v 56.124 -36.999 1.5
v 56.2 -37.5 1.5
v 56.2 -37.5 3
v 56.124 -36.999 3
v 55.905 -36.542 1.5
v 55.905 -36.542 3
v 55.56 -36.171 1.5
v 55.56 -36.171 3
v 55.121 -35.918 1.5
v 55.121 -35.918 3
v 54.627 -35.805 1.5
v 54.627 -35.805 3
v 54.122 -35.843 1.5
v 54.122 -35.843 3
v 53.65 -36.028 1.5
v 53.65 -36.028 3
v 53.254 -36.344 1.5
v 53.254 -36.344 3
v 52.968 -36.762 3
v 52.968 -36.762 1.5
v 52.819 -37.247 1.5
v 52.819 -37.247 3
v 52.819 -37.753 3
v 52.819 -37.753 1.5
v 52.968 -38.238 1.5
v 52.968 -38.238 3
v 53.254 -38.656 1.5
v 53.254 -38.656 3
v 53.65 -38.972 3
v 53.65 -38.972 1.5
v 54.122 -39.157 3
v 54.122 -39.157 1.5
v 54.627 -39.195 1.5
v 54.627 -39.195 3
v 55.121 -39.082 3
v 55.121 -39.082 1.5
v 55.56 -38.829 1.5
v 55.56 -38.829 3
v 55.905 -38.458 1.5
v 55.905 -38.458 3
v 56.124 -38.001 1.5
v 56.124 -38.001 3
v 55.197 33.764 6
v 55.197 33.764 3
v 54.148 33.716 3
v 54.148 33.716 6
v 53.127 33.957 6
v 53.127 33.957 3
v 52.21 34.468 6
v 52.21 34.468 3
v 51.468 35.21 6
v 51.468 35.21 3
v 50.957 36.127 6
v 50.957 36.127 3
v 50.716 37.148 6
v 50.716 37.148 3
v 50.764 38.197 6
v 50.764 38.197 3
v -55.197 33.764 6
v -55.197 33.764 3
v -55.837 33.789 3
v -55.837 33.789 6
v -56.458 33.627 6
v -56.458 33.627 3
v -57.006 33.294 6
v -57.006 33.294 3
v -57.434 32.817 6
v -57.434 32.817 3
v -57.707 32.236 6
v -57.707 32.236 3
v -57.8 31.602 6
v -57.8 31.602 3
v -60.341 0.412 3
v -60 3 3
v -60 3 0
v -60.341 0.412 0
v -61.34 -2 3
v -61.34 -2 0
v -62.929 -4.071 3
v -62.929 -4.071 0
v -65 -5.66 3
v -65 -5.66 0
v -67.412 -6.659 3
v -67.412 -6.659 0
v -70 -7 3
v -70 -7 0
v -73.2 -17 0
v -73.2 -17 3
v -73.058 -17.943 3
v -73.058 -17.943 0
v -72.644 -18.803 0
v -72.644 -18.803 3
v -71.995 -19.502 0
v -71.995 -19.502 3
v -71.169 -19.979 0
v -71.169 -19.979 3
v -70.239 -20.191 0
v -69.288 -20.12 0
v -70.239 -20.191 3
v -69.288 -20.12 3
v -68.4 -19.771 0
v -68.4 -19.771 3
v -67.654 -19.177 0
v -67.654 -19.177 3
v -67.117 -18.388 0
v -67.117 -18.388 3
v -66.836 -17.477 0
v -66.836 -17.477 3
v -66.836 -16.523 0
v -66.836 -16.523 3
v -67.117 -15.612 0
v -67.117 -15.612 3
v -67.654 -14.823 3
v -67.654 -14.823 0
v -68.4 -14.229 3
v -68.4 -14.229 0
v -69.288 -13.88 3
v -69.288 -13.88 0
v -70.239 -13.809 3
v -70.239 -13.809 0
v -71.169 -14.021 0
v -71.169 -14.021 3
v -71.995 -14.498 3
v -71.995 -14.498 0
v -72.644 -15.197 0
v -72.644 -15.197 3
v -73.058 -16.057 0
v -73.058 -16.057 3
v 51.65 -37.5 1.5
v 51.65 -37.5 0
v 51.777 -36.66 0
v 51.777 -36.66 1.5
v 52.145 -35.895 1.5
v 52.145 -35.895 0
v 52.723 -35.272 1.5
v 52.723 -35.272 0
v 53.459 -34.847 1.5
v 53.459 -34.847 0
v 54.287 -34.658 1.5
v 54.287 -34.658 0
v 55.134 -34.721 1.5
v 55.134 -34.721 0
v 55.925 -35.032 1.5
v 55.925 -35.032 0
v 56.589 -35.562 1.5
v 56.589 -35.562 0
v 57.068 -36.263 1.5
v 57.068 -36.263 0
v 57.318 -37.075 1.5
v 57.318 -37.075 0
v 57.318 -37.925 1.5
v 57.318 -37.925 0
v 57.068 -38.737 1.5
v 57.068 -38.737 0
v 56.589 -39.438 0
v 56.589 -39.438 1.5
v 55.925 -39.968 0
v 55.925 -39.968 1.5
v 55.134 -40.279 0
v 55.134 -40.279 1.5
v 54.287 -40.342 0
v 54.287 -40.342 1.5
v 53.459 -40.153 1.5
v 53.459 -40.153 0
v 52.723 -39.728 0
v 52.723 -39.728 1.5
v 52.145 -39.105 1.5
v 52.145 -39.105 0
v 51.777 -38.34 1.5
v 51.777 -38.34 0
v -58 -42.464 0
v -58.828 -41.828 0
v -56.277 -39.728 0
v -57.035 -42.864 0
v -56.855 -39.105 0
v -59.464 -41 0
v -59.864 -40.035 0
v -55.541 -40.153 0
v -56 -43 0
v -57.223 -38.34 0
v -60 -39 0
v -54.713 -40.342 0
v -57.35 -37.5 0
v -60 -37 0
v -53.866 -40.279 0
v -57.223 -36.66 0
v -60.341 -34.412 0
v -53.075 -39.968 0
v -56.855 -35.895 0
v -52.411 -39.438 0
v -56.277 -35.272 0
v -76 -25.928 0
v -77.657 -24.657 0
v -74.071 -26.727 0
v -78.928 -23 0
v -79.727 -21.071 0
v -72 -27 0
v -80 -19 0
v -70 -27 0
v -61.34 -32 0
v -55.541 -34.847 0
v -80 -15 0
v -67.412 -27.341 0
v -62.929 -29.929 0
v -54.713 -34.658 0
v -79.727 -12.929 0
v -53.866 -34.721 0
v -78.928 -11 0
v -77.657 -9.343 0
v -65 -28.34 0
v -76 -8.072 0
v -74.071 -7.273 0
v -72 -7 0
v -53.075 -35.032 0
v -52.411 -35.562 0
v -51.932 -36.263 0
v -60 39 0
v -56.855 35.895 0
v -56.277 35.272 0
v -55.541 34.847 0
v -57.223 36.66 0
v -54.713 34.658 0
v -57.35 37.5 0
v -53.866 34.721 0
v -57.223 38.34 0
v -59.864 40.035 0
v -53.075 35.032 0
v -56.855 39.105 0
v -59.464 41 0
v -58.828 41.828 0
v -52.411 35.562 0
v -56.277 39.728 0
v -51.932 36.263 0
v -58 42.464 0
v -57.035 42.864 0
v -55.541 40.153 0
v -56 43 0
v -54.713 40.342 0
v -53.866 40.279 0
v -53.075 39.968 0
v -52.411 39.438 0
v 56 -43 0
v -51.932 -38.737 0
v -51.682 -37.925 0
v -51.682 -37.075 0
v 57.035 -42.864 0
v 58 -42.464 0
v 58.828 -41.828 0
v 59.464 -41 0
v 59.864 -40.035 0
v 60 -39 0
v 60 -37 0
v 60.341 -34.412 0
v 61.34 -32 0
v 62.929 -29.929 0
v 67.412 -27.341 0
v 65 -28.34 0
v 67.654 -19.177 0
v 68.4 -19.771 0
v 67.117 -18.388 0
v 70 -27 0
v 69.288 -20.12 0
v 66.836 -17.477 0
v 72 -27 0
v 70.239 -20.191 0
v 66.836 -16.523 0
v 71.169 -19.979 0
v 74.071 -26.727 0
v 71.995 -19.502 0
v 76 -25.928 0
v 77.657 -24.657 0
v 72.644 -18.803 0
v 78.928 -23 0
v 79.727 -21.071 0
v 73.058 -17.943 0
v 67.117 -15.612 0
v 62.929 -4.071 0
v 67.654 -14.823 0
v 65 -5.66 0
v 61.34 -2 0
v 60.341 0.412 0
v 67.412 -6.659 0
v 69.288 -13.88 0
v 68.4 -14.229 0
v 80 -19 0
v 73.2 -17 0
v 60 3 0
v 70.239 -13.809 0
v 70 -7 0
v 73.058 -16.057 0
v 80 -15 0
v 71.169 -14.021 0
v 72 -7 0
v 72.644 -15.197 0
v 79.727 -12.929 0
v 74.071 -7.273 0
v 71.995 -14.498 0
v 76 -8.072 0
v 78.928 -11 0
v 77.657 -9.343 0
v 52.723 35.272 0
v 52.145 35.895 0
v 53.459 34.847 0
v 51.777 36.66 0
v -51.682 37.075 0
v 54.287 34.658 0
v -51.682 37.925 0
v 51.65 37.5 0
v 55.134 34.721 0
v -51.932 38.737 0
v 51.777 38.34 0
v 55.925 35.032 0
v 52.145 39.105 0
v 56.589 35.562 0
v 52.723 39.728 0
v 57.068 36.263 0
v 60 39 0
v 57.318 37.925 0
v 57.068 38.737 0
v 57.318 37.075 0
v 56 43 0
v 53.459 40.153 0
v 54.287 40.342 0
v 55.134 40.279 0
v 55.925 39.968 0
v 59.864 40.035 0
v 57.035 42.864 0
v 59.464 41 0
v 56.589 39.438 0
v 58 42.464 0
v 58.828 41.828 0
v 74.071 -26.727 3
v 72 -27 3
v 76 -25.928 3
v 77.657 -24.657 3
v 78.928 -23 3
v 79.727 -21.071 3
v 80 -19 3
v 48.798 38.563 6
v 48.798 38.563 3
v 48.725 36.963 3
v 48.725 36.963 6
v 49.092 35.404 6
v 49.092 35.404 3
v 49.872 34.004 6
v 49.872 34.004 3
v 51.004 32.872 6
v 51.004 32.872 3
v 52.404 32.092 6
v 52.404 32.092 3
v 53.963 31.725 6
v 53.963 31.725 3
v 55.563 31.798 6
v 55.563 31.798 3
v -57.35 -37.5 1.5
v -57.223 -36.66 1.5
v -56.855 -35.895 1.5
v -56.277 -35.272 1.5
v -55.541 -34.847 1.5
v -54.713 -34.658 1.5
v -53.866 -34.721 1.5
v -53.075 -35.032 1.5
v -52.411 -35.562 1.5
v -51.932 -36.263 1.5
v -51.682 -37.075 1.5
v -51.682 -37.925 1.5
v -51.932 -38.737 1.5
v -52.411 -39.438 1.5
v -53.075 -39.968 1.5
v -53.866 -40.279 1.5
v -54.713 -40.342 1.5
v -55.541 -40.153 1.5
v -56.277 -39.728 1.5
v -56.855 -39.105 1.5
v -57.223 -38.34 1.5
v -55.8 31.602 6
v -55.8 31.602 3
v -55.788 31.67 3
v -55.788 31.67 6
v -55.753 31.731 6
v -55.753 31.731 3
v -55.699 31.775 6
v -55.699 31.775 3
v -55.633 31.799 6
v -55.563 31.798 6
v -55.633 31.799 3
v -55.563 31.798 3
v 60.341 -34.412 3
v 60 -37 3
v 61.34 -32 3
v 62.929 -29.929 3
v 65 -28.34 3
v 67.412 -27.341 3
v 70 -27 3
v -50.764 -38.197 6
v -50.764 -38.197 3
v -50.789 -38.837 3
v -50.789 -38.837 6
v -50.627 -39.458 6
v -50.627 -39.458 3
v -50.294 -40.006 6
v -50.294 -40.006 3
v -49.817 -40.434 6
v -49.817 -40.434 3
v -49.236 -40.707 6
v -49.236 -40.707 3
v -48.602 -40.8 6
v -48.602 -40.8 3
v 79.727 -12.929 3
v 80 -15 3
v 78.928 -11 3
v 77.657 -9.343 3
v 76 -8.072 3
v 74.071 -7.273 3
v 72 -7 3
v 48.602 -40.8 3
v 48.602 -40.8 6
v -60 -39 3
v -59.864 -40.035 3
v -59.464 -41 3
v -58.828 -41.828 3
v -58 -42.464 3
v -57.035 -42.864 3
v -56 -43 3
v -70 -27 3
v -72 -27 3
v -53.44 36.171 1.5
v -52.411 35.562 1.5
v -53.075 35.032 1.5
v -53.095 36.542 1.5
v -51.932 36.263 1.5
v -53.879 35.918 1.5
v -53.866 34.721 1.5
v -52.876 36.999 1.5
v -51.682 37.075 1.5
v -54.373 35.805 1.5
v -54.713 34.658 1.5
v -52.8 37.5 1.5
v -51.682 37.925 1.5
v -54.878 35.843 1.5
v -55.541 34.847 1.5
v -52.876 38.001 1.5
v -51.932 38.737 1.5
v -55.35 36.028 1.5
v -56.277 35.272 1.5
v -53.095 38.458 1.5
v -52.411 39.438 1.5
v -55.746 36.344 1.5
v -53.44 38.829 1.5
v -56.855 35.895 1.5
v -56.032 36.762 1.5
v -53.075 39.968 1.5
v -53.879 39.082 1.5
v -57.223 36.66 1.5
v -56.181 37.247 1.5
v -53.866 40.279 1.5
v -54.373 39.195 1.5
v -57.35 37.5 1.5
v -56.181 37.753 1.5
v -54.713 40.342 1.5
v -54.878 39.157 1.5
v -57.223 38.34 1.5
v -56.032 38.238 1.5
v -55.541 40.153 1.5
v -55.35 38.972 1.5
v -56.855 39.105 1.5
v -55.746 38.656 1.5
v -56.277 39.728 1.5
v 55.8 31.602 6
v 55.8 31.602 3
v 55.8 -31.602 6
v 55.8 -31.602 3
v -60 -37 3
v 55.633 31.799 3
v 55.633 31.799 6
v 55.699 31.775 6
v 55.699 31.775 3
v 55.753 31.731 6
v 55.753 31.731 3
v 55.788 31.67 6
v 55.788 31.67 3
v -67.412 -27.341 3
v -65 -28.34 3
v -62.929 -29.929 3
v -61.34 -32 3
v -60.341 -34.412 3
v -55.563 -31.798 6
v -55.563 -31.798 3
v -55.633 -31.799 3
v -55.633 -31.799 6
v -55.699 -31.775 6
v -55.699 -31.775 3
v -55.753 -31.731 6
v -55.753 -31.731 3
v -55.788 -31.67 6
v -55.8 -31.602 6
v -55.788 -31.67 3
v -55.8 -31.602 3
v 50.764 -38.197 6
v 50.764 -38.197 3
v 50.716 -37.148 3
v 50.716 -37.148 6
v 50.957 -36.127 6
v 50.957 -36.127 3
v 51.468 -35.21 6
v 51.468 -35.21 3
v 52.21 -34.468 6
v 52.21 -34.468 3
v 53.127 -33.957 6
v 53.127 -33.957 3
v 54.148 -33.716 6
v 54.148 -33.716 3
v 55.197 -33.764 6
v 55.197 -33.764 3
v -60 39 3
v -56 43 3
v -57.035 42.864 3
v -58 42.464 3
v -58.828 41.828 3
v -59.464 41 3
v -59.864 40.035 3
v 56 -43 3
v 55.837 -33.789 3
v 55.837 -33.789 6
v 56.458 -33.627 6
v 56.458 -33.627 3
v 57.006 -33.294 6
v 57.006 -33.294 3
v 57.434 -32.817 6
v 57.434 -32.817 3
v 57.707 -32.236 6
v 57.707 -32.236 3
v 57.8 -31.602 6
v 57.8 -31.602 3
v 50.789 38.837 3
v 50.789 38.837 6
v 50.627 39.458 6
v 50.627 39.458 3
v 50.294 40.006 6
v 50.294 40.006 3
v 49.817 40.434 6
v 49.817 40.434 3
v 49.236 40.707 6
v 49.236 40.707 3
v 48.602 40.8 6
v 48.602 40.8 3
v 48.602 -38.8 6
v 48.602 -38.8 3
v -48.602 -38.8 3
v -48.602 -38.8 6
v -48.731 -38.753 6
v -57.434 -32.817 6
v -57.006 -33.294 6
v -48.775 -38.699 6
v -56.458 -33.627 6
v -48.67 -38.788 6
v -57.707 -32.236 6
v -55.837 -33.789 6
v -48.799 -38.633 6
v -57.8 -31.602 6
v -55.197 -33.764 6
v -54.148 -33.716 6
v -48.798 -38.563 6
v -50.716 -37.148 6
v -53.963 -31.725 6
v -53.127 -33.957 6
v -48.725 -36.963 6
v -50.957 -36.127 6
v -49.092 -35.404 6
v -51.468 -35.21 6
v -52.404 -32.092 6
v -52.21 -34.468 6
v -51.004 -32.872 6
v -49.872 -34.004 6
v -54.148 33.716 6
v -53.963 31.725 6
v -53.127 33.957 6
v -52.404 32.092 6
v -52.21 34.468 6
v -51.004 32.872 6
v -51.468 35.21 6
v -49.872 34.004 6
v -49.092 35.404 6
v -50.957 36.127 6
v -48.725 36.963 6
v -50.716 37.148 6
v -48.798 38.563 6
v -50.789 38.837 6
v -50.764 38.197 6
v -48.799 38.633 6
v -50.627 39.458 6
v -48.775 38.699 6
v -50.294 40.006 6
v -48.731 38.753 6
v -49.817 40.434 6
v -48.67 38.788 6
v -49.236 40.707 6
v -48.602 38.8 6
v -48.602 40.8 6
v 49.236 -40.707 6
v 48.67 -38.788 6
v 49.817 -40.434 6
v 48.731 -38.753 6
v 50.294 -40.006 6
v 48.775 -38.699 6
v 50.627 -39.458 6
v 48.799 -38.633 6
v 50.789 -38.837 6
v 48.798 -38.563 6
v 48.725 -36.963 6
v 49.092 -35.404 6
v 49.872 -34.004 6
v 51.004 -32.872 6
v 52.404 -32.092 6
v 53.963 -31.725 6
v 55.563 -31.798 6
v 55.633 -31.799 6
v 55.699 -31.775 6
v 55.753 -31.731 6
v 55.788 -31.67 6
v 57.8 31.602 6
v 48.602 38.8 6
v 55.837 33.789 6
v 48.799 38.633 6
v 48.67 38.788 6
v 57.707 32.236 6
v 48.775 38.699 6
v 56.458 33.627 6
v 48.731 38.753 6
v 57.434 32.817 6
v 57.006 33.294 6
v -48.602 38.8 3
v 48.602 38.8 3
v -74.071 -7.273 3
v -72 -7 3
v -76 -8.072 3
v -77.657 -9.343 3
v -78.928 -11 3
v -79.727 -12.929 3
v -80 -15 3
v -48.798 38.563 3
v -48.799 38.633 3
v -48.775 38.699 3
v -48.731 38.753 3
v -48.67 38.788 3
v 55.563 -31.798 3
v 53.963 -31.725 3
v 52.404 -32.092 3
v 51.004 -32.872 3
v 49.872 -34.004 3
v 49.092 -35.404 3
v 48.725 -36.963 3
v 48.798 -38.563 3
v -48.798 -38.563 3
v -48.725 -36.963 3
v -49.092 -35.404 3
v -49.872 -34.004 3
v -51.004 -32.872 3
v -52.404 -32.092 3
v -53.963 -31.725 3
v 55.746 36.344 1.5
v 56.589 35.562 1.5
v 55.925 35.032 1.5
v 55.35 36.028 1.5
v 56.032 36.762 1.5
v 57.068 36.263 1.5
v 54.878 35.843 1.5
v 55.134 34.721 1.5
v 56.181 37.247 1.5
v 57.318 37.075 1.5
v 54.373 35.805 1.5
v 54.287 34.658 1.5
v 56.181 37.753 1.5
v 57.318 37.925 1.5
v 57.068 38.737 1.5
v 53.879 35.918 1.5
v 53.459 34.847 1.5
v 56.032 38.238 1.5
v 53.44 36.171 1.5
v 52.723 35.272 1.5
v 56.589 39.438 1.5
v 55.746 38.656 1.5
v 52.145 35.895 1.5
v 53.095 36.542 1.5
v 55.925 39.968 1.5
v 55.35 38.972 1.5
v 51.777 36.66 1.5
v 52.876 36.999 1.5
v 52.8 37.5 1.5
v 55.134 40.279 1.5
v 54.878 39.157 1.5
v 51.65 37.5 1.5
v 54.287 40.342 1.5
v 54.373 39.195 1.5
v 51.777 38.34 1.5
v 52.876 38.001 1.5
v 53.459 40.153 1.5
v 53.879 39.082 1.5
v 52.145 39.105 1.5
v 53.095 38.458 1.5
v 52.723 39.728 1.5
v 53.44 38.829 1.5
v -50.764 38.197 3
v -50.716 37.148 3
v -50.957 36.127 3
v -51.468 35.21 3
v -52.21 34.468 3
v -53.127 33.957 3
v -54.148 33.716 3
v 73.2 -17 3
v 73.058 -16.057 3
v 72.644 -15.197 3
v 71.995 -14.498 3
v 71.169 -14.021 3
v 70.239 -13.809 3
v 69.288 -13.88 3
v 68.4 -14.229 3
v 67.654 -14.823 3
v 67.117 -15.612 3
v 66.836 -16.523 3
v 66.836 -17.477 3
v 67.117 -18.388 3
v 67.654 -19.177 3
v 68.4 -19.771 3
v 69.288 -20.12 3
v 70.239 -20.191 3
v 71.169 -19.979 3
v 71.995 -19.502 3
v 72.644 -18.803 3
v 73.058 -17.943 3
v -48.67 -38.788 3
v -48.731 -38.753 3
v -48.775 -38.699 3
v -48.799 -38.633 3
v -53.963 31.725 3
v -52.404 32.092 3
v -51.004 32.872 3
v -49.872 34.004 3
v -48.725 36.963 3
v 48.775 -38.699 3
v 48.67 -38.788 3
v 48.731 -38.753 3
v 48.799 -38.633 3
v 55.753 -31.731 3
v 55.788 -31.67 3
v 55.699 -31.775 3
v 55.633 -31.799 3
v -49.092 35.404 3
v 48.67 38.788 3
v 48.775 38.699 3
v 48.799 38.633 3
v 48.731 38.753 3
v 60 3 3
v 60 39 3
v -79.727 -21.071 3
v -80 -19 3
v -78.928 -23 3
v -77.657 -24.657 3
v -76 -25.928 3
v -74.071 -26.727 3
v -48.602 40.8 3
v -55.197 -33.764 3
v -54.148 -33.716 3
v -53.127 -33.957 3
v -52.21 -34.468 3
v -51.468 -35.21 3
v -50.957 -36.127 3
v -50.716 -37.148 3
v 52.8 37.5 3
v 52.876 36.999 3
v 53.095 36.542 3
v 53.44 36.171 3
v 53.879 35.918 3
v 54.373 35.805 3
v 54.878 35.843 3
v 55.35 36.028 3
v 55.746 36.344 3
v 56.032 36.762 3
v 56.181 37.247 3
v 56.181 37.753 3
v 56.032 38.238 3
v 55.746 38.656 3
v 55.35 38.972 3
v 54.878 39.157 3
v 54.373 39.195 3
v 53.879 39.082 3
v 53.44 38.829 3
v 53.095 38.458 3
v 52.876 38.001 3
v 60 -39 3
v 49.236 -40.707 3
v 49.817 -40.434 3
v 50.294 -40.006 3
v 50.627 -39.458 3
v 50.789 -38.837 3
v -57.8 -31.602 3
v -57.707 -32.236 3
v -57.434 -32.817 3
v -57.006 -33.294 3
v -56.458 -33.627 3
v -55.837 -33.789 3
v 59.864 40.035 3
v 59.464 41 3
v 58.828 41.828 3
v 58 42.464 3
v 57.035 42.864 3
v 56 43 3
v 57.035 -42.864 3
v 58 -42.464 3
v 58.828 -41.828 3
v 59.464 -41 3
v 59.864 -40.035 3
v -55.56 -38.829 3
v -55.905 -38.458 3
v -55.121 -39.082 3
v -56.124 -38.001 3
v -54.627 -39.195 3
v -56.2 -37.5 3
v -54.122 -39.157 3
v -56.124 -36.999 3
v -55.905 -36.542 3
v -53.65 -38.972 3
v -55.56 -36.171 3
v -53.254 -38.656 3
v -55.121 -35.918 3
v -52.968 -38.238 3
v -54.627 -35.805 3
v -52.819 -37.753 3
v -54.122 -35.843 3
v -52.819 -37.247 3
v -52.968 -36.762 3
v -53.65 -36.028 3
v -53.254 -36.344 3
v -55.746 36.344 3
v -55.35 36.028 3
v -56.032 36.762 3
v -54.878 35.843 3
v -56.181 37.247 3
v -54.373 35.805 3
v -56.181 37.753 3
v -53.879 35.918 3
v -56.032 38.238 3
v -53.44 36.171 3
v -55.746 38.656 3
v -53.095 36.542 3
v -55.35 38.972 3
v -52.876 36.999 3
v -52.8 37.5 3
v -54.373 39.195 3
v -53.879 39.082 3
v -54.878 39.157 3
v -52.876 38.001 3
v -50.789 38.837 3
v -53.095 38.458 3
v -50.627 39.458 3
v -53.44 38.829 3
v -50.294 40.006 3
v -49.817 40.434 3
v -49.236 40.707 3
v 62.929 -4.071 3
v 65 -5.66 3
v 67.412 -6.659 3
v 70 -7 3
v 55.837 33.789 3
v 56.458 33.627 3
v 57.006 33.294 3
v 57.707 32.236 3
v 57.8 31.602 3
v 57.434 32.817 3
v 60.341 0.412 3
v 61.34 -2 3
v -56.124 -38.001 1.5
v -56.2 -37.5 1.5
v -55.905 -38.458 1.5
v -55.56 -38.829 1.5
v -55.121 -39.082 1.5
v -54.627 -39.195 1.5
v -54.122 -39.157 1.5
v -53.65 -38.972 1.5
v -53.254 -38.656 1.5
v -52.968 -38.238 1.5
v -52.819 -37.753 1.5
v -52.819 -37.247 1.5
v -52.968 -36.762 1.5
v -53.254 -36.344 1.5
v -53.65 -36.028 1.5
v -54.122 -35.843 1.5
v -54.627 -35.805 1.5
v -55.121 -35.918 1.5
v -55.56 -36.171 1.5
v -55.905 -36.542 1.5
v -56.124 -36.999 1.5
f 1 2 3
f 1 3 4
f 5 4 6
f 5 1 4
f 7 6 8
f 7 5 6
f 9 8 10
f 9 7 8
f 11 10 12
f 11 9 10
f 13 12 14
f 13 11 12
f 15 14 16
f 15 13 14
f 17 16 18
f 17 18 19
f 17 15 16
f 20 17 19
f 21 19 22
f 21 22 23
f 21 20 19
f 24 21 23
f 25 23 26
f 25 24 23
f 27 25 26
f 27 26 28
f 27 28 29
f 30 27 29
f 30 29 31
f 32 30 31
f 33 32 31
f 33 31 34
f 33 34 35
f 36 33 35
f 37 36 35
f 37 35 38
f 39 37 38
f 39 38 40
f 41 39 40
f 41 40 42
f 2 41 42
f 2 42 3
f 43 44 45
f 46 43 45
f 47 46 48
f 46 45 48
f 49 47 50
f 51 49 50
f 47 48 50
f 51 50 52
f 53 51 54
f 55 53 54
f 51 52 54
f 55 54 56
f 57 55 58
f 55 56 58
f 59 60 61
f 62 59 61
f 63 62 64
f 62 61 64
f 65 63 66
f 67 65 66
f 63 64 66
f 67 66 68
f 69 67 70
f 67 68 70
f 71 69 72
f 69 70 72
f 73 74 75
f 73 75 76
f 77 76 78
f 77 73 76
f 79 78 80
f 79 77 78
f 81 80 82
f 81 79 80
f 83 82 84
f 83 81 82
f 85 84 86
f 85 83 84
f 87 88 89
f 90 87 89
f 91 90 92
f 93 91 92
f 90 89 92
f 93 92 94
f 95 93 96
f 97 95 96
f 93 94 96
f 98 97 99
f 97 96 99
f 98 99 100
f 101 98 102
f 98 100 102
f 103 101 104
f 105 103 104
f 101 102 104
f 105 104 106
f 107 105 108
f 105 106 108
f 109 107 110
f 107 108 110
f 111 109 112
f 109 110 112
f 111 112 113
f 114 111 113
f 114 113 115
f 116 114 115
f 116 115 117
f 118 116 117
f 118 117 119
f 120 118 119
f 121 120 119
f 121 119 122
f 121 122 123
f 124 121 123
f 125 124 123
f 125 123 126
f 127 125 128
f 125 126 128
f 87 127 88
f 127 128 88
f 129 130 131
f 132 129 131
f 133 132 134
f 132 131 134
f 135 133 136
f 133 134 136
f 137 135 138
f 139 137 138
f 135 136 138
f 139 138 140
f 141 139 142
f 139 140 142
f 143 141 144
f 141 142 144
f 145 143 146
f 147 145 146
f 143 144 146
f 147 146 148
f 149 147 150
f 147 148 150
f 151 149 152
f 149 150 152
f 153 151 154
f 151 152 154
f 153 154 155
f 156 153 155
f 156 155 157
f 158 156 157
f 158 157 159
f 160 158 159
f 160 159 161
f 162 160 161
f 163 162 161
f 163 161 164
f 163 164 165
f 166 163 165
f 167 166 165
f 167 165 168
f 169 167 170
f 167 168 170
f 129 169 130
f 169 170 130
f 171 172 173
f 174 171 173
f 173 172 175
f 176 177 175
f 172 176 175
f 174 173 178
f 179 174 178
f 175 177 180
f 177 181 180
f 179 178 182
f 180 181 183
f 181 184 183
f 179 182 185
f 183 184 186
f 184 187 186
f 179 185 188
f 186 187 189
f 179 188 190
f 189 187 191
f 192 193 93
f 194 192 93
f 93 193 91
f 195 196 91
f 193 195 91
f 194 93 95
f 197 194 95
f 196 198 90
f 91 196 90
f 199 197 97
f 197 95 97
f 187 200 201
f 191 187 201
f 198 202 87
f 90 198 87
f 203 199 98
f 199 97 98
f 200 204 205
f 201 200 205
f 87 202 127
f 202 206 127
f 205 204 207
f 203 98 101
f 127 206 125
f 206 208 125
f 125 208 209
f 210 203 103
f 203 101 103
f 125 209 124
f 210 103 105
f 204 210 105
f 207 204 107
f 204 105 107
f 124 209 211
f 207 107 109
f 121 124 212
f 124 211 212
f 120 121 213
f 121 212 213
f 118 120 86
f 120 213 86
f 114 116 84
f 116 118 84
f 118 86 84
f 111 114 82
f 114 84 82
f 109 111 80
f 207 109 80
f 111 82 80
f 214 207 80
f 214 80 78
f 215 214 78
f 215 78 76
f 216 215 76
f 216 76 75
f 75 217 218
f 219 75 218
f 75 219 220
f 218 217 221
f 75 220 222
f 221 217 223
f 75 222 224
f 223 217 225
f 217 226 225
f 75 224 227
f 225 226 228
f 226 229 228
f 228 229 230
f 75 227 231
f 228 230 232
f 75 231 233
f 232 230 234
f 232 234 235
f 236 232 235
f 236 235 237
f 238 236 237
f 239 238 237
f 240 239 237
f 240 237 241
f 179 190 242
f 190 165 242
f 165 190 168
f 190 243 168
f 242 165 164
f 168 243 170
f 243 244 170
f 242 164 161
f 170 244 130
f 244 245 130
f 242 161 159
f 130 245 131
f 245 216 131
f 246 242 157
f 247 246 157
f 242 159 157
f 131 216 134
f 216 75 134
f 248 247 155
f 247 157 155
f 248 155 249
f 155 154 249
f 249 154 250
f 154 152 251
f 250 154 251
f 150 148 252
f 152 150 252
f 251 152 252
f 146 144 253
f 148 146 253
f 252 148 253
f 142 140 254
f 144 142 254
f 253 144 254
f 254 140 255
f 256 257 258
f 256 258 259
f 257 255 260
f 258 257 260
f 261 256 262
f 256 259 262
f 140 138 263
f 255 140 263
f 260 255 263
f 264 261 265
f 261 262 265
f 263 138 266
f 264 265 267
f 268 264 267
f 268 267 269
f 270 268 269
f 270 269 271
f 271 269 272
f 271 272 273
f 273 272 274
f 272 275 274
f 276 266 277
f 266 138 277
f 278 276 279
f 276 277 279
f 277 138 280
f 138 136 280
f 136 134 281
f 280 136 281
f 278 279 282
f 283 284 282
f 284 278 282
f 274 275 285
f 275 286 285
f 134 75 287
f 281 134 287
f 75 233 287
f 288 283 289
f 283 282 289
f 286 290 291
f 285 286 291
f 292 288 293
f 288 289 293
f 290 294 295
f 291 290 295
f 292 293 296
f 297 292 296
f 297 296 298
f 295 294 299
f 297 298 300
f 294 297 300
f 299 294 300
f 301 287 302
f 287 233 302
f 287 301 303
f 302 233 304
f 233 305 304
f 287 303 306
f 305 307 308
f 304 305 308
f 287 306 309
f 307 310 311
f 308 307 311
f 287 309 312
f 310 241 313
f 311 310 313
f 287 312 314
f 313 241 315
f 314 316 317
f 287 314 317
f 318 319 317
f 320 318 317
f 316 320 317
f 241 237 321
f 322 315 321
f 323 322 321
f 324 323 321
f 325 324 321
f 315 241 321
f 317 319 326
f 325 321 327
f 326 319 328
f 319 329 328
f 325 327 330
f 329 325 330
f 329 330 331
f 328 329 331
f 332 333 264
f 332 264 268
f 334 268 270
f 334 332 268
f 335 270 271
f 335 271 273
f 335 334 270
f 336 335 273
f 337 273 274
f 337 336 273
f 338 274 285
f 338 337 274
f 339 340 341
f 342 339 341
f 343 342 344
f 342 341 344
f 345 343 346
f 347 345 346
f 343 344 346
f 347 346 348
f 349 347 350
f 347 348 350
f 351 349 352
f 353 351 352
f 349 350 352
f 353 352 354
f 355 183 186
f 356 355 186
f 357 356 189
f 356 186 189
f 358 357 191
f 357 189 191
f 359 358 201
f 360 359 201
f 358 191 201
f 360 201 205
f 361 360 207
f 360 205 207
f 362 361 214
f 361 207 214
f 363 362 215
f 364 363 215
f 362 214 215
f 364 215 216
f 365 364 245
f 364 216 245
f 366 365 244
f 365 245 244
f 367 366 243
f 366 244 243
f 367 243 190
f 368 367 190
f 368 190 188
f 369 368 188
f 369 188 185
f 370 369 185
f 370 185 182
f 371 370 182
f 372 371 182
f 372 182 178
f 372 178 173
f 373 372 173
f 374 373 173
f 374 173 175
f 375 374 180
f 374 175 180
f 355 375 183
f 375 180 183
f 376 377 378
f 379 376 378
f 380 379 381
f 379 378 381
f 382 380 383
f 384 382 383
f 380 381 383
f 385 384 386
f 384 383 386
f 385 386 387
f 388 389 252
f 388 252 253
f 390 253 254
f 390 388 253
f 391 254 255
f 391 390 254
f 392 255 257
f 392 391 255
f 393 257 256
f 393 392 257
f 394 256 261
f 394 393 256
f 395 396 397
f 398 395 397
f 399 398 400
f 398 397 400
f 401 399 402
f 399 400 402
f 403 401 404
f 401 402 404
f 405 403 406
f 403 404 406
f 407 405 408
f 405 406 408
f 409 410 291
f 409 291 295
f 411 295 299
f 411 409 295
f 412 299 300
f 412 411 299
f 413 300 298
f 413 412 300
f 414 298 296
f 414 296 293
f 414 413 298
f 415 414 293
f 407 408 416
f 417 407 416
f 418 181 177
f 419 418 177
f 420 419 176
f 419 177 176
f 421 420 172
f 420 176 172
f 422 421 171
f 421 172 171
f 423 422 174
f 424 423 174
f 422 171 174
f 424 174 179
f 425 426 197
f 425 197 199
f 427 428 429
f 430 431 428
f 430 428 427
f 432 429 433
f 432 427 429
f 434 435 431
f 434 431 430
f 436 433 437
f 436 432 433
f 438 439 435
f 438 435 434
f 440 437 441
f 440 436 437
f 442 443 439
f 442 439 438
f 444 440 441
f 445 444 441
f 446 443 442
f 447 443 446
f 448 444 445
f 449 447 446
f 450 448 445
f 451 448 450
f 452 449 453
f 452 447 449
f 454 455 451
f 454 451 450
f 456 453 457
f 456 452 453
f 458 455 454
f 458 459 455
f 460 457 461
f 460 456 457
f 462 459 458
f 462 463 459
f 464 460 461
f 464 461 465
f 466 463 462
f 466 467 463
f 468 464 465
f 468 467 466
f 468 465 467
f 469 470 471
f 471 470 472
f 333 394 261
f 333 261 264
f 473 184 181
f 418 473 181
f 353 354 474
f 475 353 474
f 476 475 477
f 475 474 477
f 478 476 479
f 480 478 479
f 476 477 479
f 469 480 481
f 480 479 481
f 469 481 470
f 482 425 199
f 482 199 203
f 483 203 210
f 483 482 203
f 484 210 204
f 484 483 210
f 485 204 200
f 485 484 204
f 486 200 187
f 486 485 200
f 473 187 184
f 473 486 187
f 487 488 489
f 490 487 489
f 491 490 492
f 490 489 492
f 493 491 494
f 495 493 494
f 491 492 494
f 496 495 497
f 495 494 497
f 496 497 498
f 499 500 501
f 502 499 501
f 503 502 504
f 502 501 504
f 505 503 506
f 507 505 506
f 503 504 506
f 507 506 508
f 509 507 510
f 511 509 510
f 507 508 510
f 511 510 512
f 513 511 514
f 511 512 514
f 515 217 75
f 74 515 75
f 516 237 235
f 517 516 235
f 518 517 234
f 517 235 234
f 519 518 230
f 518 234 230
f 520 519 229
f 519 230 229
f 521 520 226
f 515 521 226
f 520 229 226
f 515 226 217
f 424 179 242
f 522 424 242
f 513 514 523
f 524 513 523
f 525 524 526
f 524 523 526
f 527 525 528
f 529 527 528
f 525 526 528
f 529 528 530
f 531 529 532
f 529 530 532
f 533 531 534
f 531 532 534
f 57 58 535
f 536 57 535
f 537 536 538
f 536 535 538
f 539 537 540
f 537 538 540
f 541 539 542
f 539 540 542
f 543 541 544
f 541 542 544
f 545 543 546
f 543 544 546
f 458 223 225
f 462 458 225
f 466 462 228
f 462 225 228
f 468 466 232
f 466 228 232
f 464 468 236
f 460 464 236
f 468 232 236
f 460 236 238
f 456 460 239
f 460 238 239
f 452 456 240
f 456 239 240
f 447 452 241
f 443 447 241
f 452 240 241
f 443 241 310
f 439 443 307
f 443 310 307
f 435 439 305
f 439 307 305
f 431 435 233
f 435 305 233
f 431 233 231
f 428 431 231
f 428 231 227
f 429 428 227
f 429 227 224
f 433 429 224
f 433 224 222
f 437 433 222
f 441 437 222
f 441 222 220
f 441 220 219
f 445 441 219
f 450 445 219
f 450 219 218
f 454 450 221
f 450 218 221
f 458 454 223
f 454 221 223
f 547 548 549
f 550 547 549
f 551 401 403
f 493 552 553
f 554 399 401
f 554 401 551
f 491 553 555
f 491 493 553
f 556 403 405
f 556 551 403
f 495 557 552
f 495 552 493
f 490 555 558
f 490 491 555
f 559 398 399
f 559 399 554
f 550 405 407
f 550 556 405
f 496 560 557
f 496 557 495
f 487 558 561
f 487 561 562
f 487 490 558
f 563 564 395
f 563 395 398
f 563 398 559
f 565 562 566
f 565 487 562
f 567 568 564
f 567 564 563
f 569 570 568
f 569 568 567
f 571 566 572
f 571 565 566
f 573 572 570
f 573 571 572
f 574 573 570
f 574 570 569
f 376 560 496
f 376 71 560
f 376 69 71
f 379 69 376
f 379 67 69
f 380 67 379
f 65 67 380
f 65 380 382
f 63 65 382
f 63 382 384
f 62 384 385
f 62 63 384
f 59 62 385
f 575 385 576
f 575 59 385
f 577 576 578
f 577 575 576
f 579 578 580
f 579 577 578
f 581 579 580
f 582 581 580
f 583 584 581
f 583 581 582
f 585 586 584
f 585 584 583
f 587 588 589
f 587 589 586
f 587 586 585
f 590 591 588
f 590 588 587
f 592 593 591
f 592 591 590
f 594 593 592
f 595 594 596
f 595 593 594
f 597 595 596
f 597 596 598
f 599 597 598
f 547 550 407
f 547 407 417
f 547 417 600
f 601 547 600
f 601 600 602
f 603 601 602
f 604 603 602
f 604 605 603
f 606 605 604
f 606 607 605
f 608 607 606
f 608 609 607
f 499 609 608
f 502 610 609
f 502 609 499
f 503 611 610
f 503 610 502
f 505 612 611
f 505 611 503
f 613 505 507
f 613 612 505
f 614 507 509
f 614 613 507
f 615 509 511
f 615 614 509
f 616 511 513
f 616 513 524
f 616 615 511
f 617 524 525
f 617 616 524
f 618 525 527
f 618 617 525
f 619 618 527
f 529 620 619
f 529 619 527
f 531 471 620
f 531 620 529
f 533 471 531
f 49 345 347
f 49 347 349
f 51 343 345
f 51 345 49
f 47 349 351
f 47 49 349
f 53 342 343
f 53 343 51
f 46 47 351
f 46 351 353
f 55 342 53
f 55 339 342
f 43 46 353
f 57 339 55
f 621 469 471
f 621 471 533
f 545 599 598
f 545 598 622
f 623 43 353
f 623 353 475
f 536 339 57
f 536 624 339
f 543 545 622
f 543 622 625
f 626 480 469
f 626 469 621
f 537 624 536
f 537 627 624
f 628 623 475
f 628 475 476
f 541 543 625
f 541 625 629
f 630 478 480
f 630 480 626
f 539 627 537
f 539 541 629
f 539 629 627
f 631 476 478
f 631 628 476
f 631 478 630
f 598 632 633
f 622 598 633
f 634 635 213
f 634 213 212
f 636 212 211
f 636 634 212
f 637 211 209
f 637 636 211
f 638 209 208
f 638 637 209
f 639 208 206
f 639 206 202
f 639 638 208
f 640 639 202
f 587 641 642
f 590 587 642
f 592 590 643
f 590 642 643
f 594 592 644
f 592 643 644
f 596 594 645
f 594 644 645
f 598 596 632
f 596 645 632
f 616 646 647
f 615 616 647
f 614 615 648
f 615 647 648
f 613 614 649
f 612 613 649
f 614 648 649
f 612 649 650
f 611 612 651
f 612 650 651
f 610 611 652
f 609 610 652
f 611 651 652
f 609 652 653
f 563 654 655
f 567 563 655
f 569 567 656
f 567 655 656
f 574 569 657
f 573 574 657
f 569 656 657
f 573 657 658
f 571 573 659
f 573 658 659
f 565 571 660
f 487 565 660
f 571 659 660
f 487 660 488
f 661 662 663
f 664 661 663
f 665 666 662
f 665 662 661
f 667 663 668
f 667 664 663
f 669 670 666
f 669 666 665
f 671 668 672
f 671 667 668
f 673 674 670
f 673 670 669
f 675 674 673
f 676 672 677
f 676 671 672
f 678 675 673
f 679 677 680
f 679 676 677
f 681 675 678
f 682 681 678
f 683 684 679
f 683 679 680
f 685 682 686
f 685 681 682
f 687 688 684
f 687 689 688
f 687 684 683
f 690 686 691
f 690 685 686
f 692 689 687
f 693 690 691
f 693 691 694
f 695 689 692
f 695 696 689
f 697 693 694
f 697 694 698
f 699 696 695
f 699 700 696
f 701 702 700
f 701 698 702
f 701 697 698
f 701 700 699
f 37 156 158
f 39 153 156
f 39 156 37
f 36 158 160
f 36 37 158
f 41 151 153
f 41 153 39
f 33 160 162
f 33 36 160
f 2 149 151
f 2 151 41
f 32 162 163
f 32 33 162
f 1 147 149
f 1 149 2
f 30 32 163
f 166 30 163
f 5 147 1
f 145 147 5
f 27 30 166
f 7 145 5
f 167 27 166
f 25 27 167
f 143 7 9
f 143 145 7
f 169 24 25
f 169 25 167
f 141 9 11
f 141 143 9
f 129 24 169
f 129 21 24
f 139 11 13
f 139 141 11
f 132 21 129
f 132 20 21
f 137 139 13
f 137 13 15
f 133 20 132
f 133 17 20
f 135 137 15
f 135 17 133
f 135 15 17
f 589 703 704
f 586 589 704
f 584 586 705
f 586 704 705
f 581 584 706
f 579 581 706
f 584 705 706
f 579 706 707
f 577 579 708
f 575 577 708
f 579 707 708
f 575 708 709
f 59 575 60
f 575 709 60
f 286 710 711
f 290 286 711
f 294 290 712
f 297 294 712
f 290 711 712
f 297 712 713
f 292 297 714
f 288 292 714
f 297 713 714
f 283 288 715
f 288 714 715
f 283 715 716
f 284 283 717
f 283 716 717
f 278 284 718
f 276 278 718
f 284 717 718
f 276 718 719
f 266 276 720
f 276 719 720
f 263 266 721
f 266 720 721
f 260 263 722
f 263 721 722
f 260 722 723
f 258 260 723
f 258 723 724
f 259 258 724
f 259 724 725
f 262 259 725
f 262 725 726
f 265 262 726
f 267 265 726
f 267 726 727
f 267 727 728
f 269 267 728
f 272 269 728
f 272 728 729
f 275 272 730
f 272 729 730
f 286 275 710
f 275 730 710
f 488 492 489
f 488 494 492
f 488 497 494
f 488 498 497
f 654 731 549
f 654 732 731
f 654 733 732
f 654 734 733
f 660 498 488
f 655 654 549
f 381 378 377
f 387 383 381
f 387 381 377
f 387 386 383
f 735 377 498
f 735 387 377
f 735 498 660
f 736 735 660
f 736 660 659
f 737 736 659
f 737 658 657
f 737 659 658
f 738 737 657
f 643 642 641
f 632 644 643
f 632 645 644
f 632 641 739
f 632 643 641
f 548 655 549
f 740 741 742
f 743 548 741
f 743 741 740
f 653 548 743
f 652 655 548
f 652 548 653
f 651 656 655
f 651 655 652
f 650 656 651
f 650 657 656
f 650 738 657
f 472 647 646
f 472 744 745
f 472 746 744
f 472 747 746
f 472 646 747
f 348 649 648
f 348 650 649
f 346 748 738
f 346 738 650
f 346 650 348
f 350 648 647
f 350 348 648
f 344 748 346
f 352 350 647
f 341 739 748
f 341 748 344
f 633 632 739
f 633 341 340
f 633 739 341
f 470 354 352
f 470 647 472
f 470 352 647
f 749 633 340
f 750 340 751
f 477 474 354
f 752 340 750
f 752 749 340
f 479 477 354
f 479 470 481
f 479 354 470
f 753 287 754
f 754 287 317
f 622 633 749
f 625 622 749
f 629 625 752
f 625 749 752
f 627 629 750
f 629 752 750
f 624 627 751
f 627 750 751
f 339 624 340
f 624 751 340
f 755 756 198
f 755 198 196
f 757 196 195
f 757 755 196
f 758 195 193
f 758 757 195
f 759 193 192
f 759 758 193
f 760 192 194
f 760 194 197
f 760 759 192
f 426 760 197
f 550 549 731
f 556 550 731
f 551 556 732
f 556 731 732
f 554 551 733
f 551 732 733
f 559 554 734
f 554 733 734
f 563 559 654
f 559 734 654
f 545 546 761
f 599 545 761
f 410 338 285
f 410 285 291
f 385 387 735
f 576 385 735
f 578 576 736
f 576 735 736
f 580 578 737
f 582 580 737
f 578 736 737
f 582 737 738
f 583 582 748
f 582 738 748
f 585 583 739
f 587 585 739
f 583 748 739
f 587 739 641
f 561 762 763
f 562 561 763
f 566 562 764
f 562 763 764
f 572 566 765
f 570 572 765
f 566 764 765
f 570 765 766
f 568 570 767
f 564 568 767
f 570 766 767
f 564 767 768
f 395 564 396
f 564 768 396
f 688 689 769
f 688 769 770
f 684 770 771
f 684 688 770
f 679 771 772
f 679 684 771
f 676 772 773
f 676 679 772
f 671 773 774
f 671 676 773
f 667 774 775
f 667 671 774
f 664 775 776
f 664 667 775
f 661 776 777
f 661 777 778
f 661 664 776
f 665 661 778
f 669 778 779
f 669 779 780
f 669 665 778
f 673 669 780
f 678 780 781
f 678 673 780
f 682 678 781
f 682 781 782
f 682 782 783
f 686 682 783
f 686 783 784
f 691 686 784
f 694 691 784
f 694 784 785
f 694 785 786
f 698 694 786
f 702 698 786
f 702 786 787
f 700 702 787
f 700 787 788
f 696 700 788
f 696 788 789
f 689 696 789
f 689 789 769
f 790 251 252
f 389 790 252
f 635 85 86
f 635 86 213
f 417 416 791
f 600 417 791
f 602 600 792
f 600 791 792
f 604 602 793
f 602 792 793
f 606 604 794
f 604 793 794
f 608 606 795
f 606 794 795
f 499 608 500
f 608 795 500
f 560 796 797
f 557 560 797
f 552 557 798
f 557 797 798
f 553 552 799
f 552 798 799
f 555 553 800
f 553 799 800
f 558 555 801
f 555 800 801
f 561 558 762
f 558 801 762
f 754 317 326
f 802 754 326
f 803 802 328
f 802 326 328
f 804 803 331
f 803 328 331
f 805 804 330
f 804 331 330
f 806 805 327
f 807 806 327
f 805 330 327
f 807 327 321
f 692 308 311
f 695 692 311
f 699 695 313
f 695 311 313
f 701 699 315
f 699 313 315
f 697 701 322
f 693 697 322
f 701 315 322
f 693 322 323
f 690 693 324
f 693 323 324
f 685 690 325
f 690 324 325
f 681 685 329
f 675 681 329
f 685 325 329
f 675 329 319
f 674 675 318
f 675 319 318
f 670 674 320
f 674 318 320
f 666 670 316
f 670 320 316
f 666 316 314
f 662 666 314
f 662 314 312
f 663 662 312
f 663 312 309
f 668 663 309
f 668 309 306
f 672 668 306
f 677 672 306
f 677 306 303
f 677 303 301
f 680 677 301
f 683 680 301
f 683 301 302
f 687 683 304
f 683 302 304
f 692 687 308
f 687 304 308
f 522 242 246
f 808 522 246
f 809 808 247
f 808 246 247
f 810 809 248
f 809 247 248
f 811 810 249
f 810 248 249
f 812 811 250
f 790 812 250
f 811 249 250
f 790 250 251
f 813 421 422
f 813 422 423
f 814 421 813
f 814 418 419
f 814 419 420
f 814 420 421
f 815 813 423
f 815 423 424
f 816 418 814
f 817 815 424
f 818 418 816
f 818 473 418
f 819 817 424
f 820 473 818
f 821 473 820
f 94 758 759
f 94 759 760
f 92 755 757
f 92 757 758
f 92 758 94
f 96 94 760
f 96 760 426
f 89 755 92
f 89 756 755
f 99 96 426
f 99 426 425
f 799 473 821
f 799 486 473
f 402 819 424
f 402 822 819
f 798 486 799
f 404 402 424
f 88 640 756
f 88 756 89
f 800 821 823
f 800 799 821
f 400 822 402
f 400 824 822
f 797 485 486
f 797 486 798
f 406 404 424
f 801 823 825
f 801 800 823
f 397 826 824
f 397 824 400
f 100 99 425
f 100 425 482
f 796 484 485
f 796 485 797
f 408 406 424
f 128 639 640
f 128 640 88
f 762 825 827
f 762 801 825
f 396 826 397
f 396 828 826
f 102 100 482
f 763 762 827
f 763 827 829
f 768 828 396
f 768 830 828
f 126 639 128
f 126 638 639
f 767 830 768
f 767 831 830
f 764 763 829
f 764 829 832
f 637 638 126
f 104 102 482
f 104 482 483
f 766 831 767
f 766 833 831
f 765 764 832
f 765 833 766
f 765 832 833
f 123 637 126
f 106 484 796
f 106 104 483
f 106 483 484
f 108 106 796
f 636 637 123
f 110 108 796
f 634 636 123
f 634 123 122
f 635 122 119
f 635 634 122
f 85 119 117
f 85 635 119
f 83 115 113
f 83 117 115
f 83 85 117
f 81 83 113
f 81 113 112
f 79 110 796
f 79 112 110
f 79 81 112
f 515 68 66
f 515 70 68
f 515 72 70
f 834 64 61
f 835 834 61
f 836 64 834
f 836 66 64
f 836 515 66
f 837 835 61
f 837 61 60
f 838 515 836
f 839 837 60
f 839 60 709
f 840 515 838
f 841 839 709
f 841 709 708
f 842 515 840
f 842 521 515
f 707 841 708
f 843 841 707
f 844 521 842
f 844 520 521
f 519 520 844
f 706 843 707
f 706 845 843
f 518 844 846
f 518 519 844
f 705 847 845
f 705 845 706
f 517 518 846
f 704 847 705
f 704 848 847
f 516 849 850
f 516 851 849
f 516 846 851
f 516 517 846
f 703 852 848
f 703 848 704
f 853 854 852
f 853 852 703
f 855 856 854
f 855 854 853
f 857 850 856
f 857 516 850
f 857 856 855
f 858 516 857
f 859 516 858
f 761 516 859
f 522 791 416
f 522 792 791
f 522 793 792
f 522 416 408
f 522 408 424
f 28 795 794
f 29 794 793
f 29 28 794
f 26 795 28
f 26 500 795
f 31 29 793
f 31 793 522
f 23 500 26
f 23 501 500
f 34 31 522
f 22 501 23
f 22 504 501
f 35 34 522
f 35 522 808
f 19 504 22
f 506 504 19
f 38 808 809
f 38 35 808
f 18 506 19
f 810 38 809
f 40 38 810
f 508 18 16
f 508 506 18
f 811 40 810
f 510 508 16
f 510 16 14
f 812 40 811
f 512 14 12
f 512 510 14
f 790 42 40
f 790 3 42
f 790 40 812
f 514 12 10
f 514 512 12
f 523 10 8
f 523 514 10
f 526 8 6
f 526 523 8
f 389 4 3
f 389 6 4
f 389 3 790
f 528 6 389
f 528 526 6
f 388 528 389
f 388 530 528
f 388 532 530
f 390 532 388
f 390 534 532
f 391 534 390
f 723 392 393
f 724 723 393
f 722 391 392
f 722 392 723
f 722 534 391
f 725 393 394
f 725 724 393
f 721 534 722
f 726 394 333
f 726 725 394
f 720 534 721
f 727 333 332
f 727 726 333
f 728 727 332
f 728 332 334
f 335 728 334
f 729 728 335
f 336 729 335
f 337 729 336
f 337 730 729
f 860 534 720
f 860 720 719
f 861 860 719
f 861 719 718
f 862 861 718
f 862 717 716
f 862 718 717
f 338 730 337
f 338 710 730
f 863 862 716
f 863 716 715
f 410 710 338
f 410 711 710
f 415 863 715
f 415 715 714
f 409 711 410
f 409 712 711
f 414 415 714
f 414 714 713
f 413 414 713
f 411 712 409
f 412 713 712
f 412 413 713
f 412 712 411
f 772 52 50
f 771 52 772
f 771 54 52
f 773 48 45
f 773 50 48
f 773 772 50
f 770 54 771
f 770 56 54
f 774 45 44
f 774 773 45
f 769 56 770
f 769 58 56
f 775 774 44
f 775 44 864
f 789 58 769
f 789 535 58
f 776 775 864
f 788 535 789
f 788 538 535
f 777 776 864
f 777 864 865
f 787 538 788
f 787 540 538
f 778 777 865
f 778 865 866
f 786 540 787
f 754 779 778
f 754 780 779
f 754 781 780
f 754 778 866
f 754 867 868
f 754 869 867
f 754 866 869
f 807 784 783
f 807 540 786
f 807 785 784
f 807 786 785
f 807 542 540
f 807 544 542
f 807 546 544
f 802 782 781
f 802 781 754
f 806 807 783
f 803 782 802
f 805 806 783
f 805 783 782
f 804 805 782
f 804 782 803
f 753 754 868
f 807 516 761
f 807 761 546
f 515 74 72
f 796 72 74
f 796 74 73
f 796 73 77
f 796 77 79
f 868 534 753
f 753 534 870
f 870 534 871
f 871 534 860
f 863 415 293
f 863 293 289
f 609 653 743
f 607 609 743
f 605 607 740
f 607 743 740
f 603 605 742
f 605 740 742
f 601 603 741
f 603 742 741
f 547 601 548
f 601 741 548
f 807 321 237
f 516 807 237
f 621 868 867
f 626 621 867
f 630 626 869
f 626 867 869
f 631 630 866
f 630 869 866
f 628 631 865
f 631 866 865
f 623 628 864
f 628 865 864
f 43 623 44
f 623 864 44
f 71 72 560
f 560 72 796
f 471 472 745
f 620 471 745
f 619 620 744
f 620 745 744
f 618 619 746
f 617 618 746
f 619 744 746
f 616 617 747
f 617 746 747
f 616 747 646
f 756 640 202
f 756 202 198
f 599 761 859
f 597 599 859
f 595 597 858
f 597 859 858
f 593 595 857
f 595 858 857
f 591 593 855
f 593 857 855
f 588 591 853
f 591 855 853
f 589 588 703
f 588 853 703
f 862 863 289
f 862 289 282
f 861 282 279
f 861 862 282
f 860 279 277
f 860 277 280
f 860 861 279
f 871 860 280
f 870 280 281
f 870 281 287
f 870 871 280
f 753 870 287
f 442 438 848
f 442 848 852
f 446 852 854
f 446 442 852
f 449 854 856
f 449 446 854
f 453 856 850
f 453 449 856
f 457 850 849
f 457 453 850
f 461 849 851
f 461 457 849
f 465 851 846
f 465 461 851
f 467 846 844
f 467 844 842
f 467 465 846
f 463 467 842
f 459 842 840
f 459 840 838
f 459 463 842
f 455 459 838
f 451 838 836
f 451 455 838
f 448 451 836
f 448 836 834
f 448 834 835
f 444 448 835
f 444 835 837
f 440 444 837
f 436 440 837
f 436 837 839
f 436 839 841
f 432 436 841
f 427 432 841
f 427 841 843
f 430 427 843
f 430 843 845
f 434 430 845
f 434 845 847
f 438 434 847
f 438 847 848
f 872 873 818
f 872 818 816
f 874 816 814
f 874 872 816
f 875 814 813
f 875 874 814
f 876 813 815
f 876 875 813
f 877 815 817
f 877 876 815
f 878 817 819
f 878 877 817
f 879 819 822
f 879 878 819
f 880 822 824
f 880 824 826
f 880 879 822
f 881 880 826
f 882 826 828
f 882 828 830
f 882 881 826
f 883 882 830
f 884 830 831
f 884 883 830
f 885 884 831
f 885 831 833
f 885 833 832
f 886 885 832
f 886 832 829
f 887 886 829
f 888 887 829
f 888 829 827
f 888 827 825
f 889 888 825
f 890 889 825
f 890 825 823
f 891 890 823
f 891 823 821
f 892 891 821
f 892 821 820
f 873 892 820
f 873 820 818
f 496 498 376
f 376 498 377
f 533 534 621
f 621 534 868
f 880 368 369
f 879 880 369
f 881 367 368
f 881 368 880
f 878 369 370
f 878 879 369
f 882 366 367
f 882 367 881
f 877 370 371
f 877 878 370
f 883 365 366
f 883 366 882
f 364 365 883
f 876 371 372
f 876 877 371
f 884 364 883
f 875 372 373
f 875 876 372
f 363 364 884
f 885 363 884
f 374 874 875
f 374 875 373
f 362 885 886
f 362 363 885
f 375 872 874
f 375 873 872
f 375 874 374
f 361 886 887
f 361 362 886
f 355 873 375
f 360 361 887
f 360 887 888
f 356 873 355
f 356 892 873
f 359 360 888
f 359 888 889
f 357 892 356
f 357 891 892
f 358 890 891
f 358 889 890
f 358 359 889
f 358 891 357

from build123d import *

# Parameters (mm, degrees)
SKETCH1_R           = 1.7
BOSS_EXTRUDE1_DEPTH = 3
BOSS_EXTRUDE2_DEPTH = 3
SKETCH3_R           = 3.2
BOSS_EXTRUDE3_DEPTH = 3
SKETCH4_R           = 2.85
SKETCH4_R_2         = 1.7
CUT_EXTRUDE1_DEPTH  = 1.5


with BuildPart() as part:
    # Sketch1 → Boss-Extrude1 (new body)
    with BuildSketch(Plane.XY):
        with BuildLine():
            Line((-56, -43), (56, -43))
            ThreePointArc((56, -43), (58.828427125, -41.828427125), (60, -39))
            Line((60, -39), (60, 39))
            ThreePointArc((60, 39), (58.828427125, 41.828427125), (56, 43))
            Line((56, 43), (-56, 43))
            ThreePointArc((-56, 43), (-58.828427125, 41.828427125), (-60, 39))
            Line((-60, 39), (-60, -39))
            ThreePointArc((-60, -39), (-58.828427125, -41.828427125), (-56, -43))
        make_face()
        with Locations((-54.5, 37.5)):
            Circle(SKETCH1_R, mode=Mode.SUBTRACT)
        with Locations(Location((-54.5, -37.5, 0), (0, 0, 180))):
            Circle(SKETCH1_R, mode=Mode.SUBTRACT)
        with Locations((54.5, -37.5)):
            Circle(SKETCH1_R, mode=Mode.SUBTRACT)
        with Locations(Location((54.5, 37.5, 0), (0, 0, 180))):
            Circle(SKETCH1_R, mode=Mode.SUBTRACT)
    extrude(amount=BOSS_EXTRUDE1_DEPTH)

    # Sketch2 → Boss-Extrude2 (add)
    with BuildSketch(Plane.XY.offset(3)):
        with BuildLine():
            Line((-57.8, 31.601695159), (-57.8, -31.601695159))
            ThreePointArc((-57.8, -31.601695159), (-57.005821231, -33.293932337), (-55.196666667, -33.764406934))
            ThreePointArc((-55.196666667, -33.764406934), (-51.812994231, -34.812994231), (-50.764406934, -38.196666667))
            ThreePointArc((-50.764406934, -38.196666667), (-50.293932337, -40.005821231), (-48.601695159, -40.8))
            Line((-48.601695159, -40.8), (48.601695159, -40.8))
            ThreePointArc((48.601695159, -40.8), (50.293932337, -40.005821231), (50.764406934, -38.196666667))
            ThreePointArc((50.764406934, -38.196666667), (51.812994231, -34.812994231), (55.196666667, -33.764406934))
            ThreePointArc((55.196666667, -33.764406934), (57.005821231, -33.293932337), (57.8, -31.601695159))
            Line((57.8, -31.601695159), (57.8, 31.601695159))
            ThreePointArc((57.8, 31.601695159), (57.005821231, 33.293932337), (55.196666667, 33.764406934))
            ThreePointArc((55.196666667, 33.764406934), (51.812994231, 34.812994231), (50.764406934, 38.196666667))
            ThreePointArc((50.764406934, 38.196666667), (50.293932337, 40.005821231), (48.601695159, 40.8))
            Line((48.601695159, 40.8), (-48.601695159, 40.8))
            ThreePointArc((-48.601695159, 40.8), (-50.293932337, 40.005821231), (-50.764406934, 38.196666667))
            ThreePointArc((-50.764406934, 38.196666667), (-51.812994231, 34.812994231), (-55.196666667, 33.764406934))
            ThreePointArc((-55.196666667, 33.764406934), (-57.005821231, 33.293932337), (-57.8, 31.601695159))
        make_face()
        with BuildLine():
            Line((-48.601695159, 38.8), (48.601695159, 38.8))
            ThreePointArc((48.601695159, 38.8), (48.755534902, 38.72780193), (48.79830532, 38.563333333))
            ThreePointArc((48.79830532, 38.563333333), (50.398780669, 33.398780669), (55.563333333, 31.79830532))
            ThreePointArc((55.563333333, 31.79830532), (55.72780193, 31.755534902), (55.8, 31.601695159))
            Line((55.8, 31.601695159), (55.8, -31.601695159))
            ThreePointArc((55.8, -31.601695159), (55.72780193, -31.755534902), (55.563333333, -31.79830532))
            ThreePointArc((55.563333333, -31.79830532), (50.398780669, -33.398780669), (48.79830532, -38.563333333))
            ThreePointArc((48.79830532, -38.563333333), (48.755534902, -38.72780193), (48.601695159, -38.8))
            Line((48.601695159, -38.8), (-48.601695159, -38.8))
            ThreePointArc((-48.601695159, -38.8), (-48.755534902, -38.72780193), (-48.79830532, -38.563333333))
            ThreePointArc((-48.79830532, -38.563333333), (-50.398780669, -33.398780669), (-55.563333333, -31.79830532))
            ThreePointArc((-55.563333333, -31.79830532), (-55.72780193, -31.755534902), (-55.8, -31.601695159))
            Line((-55.8, -31.601695159), (-55.8, 31.601695159))
            ThreePointArc((-55.8, 31.601695159), (-55.72780193, 31.755534902), (-55.563333333, 31.79830532))
            ThreePointArc((-55.563333333, 31.79830532), (-50.398780669, 33.398780669), (-48.79830532, 38.563333333))
            ThreePointArc((-48.79830532, 38.563333333), (-48.755534902, 38.72780193), (-48.601695159, 38.8))
        make_face(mode=Mode.SUBTRACT)
    extrude(amount=BOSS_EXTRUDE2_DEPTH)

    # Sketch3 → Boss-Extrude3 (add)
    # profile 1 of 2: a face of its own
    with BuildSketch(Plane.XY.offset(3)):
        with BuildLine():
            Line((60, 3), (60, -7))
            Line((60, -7), (60, -27))
            Line((60, -27), (60, -37))
            ThreePointArc((60, -37), (62.928932188, -29.928932188), (70, -27))
            Line((70, -27), (72, -27))
            ThreePointArc((72, -27), (77.656854249, -24.656854249), (80, -19))
            Line((80, -19), (80, -15))
            ThreePointArc((80, -15), (77.656854249, -9.343145751), (72, -7))
            Line((72, -7), (70, -7))
            ThreePointArc((70, -7), (62.928932188, -4.071067812), (60, 3))
        make_face()
        with Locations((70, -17)):
            Circle(SKETCH3_R, mode=Mode.SUBTRACT)
    # profile 2 of 2: a face of its own
    with BuildSketch(Plane.XY.offset(3)):
        with BuildLine():
            Line((-70, -7), (-72, -7))
            ThreePointArc((-72, -7), (-77.656854249, -9.343145751), (-80, -15))
            Line((-80, -15), (-80, -19))
            ThreePointArc((-80, -19), (-77.656854249, -24.656854249), (-72, -27))
            Line((-72, -27), (-70, -27))
            ThreePointArc((-70, -27), (-62.928932188, -29.928932188), (-60, -37))
            Line((-60, -37), (-60, -27))
            Line((-60, -27), (-60, -7))
            Line((-60, -7), (-60, 3))
            ThreePointArc((-60, 3), (-62.928932188, -4.071067812), (-70, -7))
        make_face()
        with Locations(Location((-70, -17, 0), (0, 0, 180))):
            Circle(SKETCH3_R, mode=Mode.SUBTRACT)
    extrude(amount=-BOSS_EXTRUDE3_DEPTH)

    # Sketch4 → Cut-Extrude1 (cut)
    # profile 1 of 4: a face of its own
    with BuildSketch(Plane(origin=(0, 0, 0), x_dir=(-1, 0, 0), z_dir=(0, 0, -1))):
        with Locations((-54.5, 37.5)):
            Circle(SKETCH4_R)
        with Locations((-54.5, 37.5)):
            Circle(SKETCH4_R_2, mode=Mode.SUBTRACT)
    # profile 2 of 4: a face of its own
    with BuildSketch(Plane(origin=(0, 0, 0), x_dir=(-1, 0, 0), z_dir=(0, 0, -1))):
        with Locations((54.5, 37.5)):
            Circle(SKETCH4_R)
        with Locations((54.5, 37.5)):
            Circle(SKETCH4_R_2, mode=Mode.SUBTRACT)
    # profile 3 of 4: a face of its own
    with BuildSketch(Plane(origin=(0, 0, 0), x_dir=(-1, 0, 0), z_dir=(0, 0, -1))):
        with Locations((54.5, -37.5)):
            Circle(SKETCH4_R)
        with Locations((54.5, -37.5)):
            Circle(SKETCH4_R_2, mode=Mode.SUBTRACT)
    # profile 4 of 4: a face of its own
    with BuildSketch(Plane(origin=(0, 0, 0), x_dir=(-1, 0, 0), z_dir=(0, 0, -1))):
        with Locations((-54.5, -37.5)):
            Circle(SKETCH4_R)
        with Locations((-54.5, -37.5)):
            Circle(SKETCH4_R_2, mode=Mode.SUBTRACT)
    extrude(amount=-CUT_EXTRUDE1_DEPTH, mode=Mode.SUBTRACT)


solid = part.part
